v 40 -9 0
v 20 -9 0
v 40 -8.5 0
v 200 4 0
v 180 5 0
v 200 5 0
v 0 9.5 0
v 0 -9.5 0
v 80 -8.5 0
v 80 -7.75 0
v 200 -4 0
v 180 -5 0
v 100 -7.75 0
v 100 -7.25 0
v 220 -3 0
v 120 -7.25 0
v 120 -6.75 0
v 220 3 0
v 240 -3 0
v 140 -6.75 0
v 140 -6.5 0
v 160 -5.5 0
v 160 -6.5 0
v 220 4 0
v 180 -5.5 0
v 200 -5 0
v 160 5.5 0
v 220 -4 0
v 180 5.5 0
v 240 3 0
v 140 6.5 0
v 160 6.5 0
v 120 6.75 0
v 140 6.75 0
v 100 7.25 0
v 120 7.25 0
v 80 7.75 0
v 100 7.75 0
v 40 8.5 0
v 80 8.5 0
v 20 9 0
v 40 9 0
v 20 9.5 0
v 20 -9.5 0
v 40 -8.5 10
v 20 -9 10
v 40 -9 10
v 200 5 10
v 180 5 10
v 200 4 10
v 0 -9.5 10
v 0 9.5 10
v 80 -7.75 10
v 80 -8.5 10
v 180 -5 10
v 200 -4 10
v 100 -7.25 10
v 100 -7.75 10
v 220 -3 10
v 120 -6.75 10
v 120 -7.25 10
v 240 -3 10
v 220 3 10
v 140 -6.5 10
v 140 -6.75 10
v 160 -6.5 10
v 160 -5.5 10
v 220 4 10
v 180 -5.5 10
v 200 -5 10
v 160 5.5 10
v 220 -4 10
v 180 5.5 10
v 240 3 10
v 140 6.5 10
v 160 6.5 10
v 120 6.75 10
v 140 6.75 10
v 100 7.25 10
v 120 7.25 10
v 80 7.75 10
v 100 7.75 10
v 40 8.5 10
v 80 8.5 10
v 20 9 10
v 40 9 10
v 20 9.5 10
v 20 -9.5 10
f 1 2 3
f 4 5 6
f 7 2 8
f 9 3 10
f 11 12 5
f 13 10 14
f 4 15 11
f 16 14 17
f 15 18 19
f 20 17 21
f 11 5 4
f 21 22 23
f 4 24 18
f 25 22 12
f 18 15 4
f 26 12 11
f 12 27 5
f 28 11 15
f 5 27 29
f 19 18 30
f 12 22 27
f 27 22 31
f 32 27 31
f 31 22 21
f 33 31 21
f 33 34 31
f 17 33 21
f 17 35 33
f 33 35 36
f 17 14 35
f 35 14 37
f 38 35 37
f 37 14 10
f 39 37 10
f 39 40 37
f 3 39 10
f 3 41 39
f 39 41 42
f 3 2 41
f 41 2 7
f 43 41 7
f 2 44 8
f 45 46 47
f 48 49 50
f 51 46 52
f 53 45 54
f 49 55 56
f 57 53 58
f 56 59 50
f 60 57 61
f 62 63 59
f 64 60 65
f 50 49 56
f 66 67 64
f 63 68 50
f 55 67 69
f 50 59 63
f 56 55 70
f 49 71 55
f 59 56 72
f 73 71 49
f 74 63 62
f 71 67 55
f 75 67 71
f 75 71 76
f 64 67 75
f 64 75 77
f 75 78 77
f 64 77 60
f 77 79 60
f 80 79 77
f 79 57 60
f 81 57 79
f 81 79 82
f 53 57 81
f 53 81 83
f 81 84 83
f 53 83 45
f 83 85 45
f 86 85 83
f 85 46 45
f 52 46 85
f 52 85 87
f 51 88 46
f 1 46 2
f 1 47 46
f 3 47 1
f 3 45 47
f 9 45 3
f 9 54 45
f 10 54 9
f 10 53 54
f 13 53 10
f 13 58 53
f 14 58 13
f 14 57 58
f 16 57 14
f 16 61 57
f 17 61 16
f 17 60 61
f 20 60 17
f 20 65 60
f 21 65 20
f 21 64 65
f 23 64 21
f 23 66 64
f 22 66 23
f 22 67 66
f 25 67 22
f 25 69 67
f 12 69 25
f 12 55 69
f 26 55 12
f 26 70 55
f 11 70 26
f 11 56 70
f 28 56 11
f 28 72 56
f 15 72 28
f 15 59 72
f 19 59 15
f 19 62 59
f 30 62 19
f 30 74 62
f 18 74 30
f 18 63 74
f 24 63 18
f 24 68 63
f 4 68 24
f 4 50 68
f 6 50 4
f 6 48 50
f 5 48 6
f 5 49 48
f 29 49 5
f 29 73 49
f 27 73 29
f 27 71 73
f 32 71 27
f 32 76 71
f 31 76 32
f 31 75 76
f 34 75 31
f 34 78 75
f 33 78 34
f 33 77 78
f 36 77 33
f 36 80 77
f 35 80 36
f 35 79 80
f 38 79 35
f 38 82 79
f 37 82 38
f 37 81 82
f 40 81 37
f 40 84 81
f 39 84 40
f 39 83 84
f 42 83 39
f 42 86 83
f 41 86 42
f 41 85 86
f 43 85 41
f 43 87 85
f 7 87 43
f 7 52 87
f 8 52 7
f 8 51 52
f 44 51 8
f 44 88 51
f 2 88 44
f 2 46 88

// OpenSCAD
// Units: mm. Beam-model study only; physical/manufacturing validation pending.
linear_extrude(height=10)
polygon(points=[[0,-9.5],[20.0,-9.5],[20.0,-9.0],[40.0,-9.0],[40.0,-8.5],[60.0,-8.5],[80.0,-8.5],[80.0,-7.75],[100.0,-7.75],[100.0,-7.25],[120.0,-7.25],[120.0,-6.75],[140.0,-6.75],[140.0,-6.5],[160.0,-6.5],[160.0,-5.5],[180.0,-5.5],[180.0,-5.0],[200.0,-5.0],[200.0,-4.0],[220.0,-4.0],[220.0,-3.0],[240.0,-3.0],[240,3.0],[220.0,3.0],[220.0,4.0],[200.0,4.0],[200.0,5.0],[180.0,5.0],[180.0,5.5],[160.0,5.5],[160.0,6.5],[140.0,6.5],[140.0,6.75],[120.0,6.75],[120.0,7.25],[100.0,7.25],[100.0,7.75],[80.0,7.75],[80.0,8.5],[60.0,8.5],[40.0,8.5],[40.0,9.0],[20.0,9.0],[20.0,9.5],[0.0,9.5]]);
